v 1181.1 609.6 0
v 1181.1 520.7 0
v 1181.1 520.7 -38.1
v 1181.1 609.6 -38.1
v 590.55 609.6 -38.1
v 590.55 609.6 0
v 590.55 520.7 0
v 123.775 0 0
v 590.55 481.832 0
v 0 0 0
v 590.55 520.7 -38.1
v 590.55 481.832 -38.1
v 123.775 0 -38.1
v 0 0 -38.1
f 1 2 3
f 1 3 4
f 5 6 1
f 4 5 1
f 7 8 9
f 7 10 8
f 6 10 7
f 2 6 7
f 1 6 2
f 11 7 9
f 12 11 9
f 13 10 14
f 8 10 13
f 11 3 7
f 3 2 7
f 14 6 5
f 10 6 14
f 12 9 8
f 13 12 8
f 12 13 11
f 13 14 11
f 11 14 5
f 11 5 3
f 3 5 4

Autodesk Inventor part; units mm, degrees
ref_plane "YZ Plane" through (0, 0, 0) normal (1, 0, 0) x (0, 1, 0)
ref_plane "XZ Plane" through (0, 0, 0) normal (0, 1, 0) x (-1, 0, 0)
ref_plane "XY Plane" through (0, 0, 0) normal (0, 0, 1) x (1, 0, 0)
sketch "Sketch1" plane through (0, 0, 0) normal (0, 0, 1) x (1, 0, 0)
  line L0 (0, 0) -> (1219.2, 0) projected
  line L1 (1181.1, 0) -> (1181.1, 609.6) projected
  line L2 (1181.1, 1219.2) -> (0, 0) projected
  line L3 (0, 0) -> (590.55, 609.6)
  line L4 (590.55, 520.7) -> (590.55, 481.8325)
  line L5 (590.55, 481.8325) -> (123.7747, 0)
  line L6 (590.55, 609.6) -> (1181.1, 609.6)
  line L7 (1181.1, 520.7) -> (590.55, 520.7)
  dimension "d0" = 88.9
  dimension "d1" = 88.9
extrude "Extrusion1" add sketch "Sketch1" against normal blind 38.1 contours L2 L6 L1 L7 L4 L5 L0
properties part number "side-side1"
